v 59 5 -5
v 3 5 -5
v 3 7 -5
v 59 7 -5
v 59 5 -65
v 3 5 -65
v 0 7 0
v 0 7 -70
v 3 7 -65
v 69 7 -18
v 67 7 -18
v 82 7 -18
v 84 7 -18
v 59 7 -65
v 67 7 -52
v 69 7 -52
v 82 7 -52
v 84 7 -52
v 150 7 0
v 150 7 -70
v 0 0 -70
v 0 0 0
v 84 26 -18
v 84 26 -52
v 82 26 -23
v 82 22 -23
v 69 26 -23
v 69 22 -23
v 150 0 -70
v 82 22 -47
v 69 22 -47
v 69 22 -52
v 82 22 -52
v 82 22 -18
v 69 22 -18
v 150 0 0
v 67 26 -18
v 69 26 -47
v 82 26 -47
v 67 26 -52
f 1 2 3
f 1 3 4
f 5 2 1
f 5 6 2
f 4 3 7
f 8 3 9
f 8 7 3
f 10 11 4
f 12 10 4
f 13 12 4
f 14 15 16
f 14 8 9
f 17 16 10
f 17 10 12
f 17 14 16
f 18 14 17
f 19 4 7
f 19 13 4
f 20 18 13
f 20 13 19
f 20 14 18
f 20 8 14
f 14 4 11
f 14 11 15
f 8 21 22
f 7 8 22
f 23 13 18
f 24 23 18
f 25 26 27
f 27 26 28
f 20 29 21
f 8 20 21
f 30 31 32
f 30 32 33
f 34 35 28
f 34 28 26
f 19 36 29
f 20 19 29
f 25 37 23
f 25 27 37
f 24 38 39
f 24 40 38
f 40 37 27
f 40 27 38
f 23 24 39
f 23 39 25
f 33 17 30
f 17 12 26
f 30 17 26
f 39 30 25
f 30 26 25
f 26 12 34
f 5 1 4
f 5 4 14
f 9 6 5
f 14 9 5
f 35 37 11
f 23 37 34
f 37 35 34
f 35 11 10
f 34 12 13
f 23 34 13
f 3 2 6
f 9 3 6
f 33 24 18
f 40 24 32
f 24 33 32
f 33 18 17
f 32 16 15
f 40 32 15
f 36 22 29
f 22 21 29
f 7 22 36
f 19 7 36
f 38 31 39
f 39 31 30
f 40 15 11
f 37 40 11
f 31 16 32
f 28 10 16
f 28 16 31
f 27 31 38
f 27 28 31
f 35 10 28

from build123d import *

# Parameters (mm, degrees)
EXTRUDE_3_DEPTH     = 5
SKETCH_2_6_W        = 56
SKETCH_2_6_H        = 60
EXTRUDE_4_DEPTH     = 7
SKETCH_4_W          = 56
SKETCH_4_H          = 60
EXTRUDE_5_DEPTH     = 5
EXTRUDE_6_DEPTH     = 19
SKETCH_7_W          = 13
SKETCH_7_H          = 15
CUT_EXTRUDE_1_DEPTH = 34


with BuildPart() as part:
    # Эскиз2 → Бобышка-Вытянуть3 (new body)
    with BuildSketch(Plane(origin=(0, 0, 0), x_dir=(1, 0, 0), z_dir=(0, 1, 0))):
        Polygon((0, 0), (150, 0), (150, 70), (0, 70), (0, 5), align=None)
    extrude(amount=EXTRUDE_3_DEPTH)

    # Эскиз2<6> → Бобышка-Вытянуть4 (add)
    with BuildSketch(Plane(origin=(0, 0, 0), x_dir=(1, 0, 0), z_dir=(0, 1, 0))):
        Polygon((0, 0), (150, 0), (150, 70), (0, 70), (0, 5), align=None)
        with Locations((31, 35)):
            Rectangle(SKETCH_2_6_W, SKETCH_2_6_H, mode=Mode.SUBTRACT)
    extrude(amount=EXTRUDE_4_DEPTH)

    # Эскиз4 → Бобышка-Вытянуть5 (add)
    with BuildSketch(Plane(origin=(0, 5, 0), x_dir=(1, 0, 0), z_dir=(0, 1, 0))):
        with Locations((31, 35)):
            Rectangle(SKETCH_4_W, SKETCH_4_H)
    extrude(amount=-EXTRUDE_5_DEPTH)

    # Эскиз5 → Бобышка-Вытянуть6 (add)
    with BuildSketch(Plane(origin=(0, 7, 0), x_dir=(1, 0, 0), z_dir=(0, 1, 0))):
        Polygon((84, 52), (69, 52), (67, 52), (67, 18), (84, 18), align=None)
        Polygon((69, 23), (69, 35), (69, 47), (82, 47), (82, 35), (82, 23), align=None, mode=Mode.SUBTRACT)
    extrude(amount=EXTRUDE_6_DEPTH)

    # Эскиз7 → Вырез-Вытянуть1 (cut)
    with BuildSketch(Plane.XY.offset(-18)):
        with Locations((75.5, 14.5)):
            Rectangle(SKETCH_7_W, SKETCH_7_H)
    extrude(amount=-CUT_EXTRUDE_1_DEPTH, mode=Mode.SUBTRACT)


solid = part.part
